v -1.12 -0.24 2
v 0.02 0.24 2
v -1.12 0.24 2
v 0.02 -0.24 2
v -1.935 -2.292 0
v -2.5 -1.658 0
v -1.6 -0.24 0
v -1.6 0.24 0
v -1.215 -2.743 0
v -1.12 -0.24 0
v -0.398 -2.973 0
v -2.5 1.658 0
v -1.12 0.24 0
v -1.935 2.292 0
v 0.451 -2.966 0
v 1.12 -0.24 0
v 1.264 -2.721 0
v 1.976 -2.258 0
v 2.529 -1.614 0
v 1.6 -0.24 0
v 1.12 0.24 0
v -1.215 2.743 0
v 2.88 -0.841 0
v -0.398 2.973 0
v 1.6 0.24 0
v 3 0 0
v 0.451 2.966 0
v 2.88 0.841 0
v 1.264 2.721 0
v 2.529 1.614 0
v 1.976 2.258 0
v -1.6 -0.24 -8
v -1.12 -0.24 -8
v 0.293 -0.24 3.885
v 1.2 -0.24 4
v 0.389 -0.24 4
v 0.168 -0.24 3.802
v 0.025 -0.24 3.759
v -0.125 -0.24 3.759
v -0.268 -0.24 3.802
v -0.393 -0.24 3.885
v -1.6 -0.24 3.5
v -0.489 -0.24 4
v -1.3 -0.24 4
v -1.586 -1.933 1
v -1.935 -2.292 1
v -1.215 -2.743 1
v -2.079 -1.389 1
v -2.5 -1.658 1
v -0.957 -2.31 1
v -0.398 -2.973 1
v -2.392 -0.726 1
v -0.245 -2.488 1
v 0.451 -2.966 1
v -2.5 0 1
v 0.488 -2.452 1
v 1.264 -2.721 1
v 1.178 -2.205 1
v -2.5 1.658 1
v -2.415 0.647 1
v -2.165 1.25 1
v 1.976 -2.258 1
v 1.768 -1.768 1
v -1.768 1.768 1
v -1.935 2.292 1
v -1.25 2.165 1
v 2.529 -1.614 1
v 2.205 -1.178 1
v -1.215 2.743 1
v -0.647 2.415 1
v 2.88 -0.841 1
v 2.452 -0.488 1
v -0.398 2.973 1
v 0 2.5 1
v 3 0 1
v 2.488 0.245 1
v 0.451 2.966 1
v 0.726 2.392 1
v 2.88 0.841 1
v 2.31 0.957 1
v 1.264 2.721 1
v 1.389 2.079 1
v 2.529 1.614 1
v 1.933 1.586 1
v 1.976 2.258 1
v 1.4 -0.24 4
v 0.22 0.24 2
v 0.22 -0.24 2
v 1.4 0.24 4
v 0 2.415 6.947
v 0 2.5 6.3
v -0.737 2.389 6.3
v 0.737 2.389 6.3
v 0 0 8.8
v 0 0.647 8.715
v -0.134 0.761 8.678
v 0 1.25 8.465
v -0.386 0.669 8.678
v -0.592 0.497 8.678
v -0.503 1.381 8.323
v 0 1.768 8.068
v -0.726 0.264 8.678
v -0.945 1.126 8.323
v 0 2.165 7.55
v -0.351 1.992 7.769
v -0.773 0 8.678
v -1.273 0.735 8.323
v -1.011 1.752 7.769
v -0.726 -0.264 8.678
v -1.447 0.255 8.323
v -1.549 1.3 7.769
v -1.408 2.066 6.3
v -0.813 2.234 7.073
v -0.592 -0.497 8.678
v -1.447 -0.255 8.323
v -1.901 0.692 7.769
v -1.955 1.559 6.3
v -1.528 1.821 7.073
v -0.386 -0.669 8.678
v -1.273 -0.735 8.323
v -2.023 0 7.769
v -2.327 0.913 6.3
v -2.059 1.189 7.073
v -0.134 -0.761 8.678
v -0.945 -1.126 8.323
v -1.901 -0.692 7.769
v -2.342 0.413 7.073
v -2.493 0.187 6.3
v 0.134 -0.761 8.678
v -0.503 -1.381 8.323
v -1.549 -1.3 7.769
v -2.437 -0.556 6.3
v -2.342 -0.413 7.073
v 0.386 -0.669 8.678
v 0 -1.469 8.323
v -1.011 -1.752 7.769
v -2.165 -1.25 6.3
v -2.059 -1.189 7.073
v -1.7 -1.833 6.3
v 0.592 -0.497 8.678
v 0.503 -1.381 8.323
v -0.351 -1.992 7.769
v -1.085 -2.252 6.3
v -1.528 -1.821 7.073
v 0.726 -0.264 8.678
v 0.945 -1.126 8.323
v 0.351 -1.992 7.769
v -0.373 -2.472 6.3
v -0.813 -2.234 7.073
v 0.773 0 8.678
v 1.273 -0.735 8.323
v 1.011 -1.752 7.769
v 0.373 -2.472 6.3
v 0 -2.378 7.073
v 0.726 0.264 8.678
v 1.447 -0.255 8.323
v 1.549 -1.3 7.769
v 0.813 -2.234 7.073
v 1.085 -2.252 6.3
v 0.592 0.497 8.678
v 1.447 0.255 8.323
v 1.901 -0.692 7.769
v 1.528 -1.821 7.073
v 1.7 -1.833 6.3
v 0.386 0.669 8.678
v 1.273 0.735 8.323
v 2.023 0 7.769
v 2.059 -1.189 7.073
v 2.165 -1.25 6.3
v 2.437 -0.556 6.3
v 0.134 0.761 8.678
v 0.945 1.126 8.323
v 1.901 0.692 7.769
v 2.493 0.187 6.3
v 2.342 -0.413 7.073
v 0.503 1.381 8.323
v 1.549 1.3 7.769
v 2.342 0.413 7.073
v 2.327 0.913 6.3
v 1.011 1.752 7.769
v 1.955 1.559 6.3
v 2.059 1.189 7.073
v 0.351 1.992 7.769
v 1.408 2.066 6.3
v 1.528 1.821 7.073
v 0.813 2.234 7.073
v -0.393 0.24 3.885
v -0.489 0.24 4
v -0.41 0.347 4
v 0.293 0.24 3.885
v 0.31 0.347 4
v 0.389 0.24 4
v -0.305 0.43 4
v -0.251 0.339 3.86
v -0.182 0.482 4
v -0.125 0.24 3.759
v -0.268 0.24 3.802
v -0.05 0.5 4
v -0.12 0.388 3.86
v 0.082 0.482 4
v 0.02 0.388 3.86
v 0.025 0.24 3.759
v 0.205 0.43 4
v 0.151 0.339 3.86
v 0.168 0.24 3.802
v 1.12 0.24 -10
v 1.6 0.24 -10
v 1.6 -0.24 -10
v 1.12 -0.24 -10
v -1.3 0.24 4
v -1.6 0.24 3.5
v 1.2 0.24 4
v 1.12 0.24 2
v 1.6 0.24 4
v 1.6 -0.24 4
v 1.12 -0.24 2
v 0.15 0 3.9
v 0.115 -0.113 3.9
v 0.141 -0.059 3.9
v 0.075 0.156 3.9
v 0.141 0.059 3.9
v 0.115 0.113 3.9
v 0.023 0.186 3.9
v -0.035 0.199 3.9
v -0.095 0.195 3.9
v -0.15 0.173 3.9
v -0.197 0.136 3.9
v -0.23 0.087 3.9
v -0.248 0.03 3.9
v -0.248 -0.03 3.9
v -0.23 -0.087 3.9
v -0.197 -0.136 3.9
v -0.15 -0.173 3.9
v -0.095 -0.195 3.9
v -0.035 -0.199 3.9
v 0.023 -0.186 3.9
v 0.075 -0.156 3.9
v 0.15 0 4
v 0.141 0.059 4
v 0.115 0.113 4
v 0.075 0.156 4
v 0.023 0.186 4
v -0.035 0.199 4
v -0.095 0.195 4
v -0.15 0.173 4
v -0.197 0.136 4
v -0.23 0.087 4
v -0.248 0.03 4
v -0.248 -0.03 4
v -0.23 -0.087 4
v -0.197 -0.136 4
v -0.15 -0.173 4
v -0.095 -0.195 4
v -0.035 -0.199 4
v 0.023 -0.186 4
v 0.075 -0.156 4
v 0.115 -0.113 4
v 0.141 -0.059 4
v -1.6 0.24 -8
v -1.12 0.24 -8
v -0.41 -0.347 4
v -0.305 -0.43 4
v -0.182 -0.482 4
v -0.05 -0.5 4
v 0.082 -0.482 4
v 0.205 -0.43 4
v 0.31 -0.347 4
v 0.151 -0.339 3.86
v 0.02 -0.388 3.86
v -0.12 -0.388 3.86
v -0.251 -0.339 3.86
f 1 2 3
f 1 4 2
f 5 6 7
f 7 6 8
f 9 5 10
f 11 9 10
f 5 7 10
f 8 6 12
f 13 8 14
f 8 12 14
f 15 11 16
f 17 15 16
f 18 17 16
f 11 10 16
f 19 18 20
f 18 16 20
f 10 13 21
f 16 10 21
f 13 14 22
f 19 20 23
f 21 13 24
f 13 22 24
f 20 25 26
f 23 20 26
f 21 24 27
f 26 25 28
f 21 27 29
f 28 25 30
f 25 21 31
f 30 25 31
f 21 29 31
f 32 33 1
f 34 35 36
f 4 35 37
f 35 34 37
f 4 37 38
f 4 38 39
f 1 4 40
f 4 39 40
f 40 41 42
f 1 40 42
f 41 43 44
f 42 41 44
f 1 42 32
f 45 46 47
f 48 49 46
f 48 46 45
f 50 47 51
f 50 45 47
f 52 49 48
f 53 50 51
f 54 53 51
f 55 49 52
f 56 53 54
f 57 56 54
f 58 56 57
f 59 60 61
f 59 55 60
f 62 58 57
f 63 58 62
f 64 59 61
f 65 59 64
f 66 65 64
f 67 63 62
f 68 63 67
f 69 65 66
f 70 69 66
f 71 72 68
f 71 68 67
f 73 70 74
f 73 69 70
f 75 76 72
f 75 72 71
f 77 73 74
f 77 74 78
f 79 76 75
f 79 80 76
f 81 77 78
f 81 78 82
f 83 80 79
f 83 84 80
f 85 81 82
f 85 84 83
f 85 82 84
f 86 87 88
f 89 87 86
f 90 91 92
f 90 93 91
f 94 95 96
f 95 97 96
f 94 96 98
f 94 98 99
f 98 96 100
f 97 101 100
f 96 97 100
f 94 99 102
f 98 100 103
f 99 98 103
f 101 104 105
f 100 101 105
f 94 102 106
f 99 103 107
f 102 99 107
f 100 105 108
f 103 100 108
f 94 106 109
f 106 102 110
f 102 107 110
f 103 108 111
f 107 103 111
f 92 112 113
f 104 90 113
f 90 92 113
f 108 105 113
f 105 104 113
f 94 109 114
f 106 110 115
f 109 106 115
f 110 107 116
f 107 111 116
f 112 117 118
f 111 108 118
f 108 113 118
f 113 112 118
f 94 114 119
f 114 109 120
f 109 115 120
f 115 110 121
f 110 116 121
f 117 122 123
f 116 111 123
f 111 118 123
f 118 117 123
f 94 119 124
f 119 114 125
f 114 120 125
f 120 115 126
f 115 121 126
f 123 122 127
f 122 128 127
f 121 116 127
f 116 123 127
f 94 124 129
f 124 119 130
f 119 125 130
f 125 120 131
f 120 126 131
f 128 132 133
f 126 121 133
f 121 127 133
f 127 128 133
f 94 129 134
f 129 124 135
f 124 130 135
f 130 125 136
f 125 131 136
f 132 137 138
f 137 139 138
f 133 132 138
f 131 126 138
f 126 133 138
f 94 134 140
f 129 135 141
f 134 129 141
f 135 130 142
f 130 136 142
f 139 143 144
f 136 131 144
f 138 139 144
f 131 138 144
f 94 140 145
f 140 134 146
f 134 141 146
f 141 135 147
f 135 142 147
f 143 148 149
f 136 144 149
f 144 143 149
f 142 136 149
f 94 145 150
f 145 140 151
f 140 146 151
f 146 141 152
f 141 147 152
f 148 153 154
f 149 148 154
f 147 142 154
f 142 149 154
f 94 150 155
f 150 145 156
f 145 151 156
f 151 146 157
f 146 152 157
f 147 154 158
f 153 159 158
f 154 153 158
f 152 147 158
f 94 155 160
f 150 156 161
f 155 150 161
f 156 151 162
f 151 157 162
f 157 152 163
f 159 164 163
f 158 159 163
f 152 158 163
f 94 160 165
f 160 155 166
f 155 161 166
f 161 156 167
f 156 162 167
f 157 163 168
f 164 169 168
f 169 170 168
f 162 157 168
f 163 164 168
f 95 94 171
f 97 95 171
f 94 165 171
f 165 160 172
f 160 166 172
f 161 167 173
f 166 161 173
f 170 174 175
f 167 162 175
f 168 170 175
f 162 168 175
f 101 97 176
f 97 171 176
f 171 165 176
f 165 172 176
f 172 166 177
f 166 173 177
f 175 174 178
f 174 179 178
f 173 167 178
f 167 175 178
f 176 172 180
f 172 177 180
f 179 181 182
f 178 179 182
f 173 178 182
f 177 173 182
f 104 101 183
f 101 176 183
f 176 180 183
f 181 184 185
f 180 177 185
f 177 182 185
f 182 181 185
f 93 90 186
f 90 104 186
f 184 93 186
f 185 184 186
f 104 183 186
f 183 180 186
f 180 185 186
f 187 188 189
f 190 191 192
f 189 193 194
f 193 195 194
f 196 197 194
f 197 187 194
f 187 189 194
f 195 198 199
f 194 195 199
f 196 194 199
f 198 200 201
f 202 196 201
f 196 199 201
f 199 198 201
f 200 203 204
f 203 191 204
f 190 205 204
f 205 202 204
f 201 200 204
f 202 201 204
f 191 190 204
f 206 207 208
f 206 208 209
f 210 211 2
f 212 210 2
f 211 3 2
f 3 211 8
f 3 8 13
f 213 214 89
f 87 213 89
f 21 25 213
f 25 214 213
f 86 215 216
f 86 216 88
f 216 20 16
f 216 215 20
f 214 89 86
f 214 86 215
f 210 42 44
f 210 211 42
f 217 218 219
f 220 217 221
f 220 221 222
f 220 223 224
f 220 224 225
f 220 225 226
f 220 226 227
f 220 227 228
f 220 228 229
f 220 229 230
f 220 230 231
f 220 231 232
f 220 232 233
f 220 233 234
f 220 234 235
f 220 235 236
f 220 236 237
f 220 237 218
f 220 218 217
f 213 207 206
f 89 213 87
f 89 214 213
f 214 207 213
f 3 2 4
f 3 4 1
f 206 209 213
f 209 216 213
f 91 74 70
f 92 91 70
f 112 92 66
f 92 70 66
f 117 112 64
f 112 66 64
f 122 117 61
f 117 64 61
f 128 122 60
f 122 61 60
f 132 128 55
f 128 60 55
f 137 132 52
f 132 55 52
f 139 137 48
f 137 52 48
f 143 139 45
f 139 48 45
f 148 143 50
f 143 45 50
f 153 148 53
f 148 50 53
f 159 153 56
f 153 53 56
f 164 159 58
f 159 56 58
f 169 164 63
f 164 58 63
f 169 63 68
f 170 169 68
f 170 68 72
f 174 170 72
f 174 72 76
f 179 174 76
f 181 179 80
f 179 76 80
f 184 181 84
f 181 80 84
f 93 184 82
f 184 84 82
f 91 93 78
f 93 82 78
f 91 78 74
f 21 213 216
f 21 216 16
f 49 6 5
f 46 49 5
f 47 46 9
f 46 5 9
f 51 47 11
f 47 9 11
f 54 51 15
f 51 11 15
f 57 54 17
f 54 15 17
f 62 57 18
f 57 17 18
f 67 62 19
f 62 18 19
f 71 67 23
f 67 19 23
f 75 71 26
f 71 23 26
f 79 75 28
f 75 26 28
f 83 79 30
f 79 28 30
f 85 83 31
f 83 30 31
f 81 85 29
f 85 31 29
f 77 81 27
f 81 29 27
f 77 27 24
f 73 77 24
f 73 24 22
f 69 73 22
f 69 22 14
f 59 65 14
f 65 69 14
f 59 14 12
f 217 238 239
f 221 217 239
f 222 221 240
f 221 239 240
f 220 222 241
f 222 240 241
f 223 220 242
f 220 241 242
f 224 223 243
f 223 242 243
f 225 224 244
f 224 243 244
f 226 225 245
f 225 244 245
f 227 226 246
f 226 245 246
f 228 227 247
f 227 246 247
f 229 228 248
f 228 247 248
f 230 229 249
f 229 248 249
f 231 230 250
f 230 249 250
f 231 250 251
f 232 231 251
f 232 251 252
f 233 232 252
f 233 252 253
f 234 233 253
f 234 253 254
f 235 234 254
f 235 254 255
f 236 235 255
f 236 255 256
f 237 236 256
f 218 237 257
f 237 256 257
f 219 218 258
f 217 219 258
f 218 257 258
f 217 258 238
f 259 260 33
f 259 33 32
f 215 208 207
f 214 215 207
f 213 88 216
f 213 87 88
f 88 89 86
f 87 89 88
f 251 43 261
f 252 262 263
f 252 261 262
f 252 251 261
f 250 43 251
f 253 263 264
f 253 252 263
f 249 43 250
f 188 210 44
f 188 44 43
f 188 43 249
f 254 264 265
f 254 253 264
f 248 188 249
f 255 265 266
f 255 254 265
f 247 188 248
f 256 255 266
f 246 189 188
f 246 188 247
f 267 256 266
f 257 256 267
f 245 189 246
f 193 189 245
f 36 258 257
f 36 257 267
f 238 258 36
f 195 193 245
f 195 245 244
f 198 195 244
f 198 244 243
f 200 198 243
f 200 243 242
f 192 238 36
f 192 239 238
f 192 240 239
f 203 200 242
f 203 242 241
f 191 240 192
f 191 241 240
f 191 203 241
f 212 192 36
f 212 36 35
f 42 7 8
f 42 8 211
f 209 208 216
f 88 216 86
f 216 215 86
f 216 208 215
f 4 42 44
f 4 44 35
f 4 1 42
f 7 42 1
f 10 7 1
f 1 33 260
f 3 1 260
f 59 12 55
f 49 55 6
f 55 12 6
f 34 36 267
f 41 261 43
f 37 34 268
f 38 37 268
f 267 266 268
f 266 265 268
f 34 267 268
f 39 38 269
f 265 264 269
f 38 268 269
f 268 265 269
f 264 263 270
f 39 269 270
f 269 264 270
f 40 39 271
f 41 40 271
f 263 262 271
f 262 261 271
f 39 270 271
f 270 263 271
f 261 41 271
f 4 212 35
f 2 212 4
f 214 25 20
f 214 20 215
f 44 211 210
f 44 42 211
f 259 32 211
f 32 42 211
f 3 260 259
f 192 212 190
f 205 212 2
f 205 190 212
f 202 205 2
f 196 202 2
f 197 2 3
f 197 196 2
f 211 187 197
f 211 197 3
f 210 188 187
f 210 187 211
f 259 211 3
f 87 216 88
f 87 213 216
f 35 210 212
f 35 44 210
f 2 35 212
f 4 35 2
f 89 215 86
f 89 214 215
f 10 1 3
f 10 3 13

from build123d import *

# Parameters (mm, degrees)
ESBO_O1_R                  = 3
RESSALTO_EXTRUS_O1_DEPTH   = 1
CORTE_EXTRUS_O1_DEPTH      = 1
ESBO_O5_W                  = 0.48
ESBO_O5_H                  = 0.48
RESSALTO_EXTRUS_O2_DEPTH   = 8
RESSALTO_EXTRUS_O2_2_DEPTH = 8
ESBO_O6_W                  = 0.48
ESBO_O6_H                  = 0.48
RESSALTO_EXTRUS_O3_DEPTH   = 2
CORTE_EXTRUS_O2_DEPTH      = 0.24
RESSALTO_EXTRUS_O4_DEPTH   = 0.24
RESSALTO_EXTRUS_O4_2_DEPTH = 0.24
ESBO_O12_R                 = 0.2
CORTE_EXTRUS_O3_DEPTH      = 0.1


with BuildPart() as part:
    # Esboço1 → Ressalto-extrusão1 (new body)
    with BuildSketch(Plane.XY):
        Circle(ESBO_O1_R)
    extrude(amount=RESSALTO_EXTRUS_O1_DEPTH)

    # Esboço3 → Revolução1 (revolve)
    with BuildSketch(Plane(origin=(0, 0, 0), x_dir=(0, 0, -1), z_dir=(1, 0, 0))):
        with BuildLine():
            Line((-1, 0), (-8.8, 0))
            ThreePointArc((-8.8, 0), (-8.067766953, 1.767766953), (-6.3, 2.5))
            Line((-6.3, 2.5), (-1, 2.5))
            Line((-1, 2.5), (-1, 0))
        make_face()
    revolve(axis=Axis((0, 0, 1), (0, 0, 1)))

    # Esboço4 → Corte-extrusão1 (cut)
    with BuildSketch(Plane(origin=(0, 0, 0), x_dir=(-1, 0, 0), z_dir=(0, 0, -1))):
        with BuildLine():
            Line((2.5, 1.658312395), (2.5, -1.658312395))
            ThreePointArc((2.5, -1.658312395), (3, 0), (2.5, 1.658312395))
        make_face()
    extrude(amount=-CORTE_EXTRUS_O1_DEPTH, mode=Mode.SUBTRACT)

    # Esboço7 → Corte-extrusão2 (cut, symmetric)
    with BuildSketch(Plane(origin=(0, 0, 0), x_dir=(1, 0, 0), z_dir=(0, 1, 0))):
        Polygon((-1.6, 0), (-1.6, -3.5), (-1.3, -4), (1.2, -4), (0.02, -2), (-1.12, -2), (-1.12, 0), align=None)
        Polygon((1.6, 0), (1.6, -4), (1.4, -4), (0.22, -2), (1.12, -2), (1.12, 0), align=None)
    extrude(amount=CORTE_EXTRUS_O2_DEPTH, both=True, mode=Mode.SUBTRACT)


with BuildPart() as body_2:
    # Esboço5 → Ressalto-extrusão2 (new body)
    with BuildSketch(Plane(origin=(0, 0, 0), x_dir=(-1, 0, 0), z_dir=(0, 0, -1))):
        with Locations((-1.36, 0)):
            Rectangle(ESBO_O5_W, ESBO_O5_H)
    extrude(amount=RESSALTO_EXTRUS_O2_DEPTH)


with BuildPart() as body_3:
    # Esboço5 → Ressalto-extrus_o2 2 (new body)
    with BuildSketch(Plane(origin=(0, 0, 0), x_dir=(-1, 0, 0), z_dir=(0, 0, -1))):
        with Locations((1.36, 0)):
            Rectangle(ESBO_O5_W, ESBO_O5_H)
    extrude(amount=RESSALTO_EXTRUS_O2_2_DEPTH)


with BuildPart() as body_4:
    # Esboço6 → Ressalto-extrusão3 (new body)
    with BuildSketch(Plane(origin=(0, 0, -8), x_dir=(-1, 0, 0), z_dir=(0, 0, -1))):
        with Locations((-1.36, 0)):
            Rectangle(ESBO_O6_W, ESBO_O6_H)
    extrude(amount=RESSALTO_EXTRUS_O3_DEPTH)


with BuildPart() as body_5:
    # Esboço8 → Ressalto-extrusão4 (new body, symmetric)
    with BuildSketch(Plane(origin=(0, 0, 0), x_dir=(1, 0, 0), z_dir=(0, 1, 0))):
        Polygon((-1.3, -4), (1.2, -4), (0.02, -2), (-1.12, -2), (-1.12, 0), (-1.6, 0), (-1.6, -3.5), align=None)
    extrude(amount=RESSALTO_EXTRUS_O4_DEPTH, both=True)

    # Combinar2: union body 3
    add(body_3.part)

    # Esboço10 → Corte-Revolução1 (revolve, cut)
    with BuildSketch(Plane(origin=(0, 0, 0), x_dir=(1, 0, 0), z_dir=(0, 1, 0))):
        with BuildLine():
            Line((-0.05, -4), (-0.05, -3.7))
            ThreePointArc((-0.05, -3.7), (-0.341547595, -3.780754009), (-0.55, -4))
            Line((-0.55, -4), (-0.05, -4))
        make_face()
    revolve(axis=Axis((-0.05, 0, 4), (0, 0, -1)), mode=Mode.SUBTRACT)


with BuildPart() as body_6:
    # Esboço8 → Ressalto-extrus_o4 2 (new body, symmetric)
    with BuildSketch(Plane(origin=(0, 0, 0), x_dir=(1, 0, 0), z_dir=(0, 1, 0))):
        Polygon((0.22, -2), (1.4, -4), (1.6, -4), (1.6, 0), (1.12, 0), (1.12, -2), align=None)
    extrude(amount=RESSALTO_EXTRUS_O4_2_DEPTH, both=True)

    # Combinar1: union body 4, body 2
    add(body_4.part)
    add(body_2.part)


with BuildPart() as body_4_2:
    # Esboço11 → Revolução2 (revolve)
    with BuildSketch(Plane(origin=(0, 0, 0), x_dir=(1, 0, 0), z_dir=(0, 1, 0))):
        with BuildLine():
            Line((-0.55, -4), (-0.05, -4))
            Line((-0.05, -4), (-0.05, -3.7))
            ThreePointArc((-0.05, -3.7), (-0.341547595, -3.780754009), (-0.55, -4))
        make_face()
    revolve(axis=Axis((-0.05, 0, 4), (0, 0, -1)))

    # Combinar3: union body 5
    add(body_5.part)

    # Esboço12 → Corte-extrusão3 (cut)
    with BuildSketch(Plane.XY.offset(4)):
        with Locations((-0.05, 0)):
            Circle(ESBO_O12_R)
    extrude(amount=-CORTE_EXTRUS_O3_DEPTH, mode=Mode.SUBTRACT)


solid = Compound([part.part, body_6.part, body_4_2.part])
